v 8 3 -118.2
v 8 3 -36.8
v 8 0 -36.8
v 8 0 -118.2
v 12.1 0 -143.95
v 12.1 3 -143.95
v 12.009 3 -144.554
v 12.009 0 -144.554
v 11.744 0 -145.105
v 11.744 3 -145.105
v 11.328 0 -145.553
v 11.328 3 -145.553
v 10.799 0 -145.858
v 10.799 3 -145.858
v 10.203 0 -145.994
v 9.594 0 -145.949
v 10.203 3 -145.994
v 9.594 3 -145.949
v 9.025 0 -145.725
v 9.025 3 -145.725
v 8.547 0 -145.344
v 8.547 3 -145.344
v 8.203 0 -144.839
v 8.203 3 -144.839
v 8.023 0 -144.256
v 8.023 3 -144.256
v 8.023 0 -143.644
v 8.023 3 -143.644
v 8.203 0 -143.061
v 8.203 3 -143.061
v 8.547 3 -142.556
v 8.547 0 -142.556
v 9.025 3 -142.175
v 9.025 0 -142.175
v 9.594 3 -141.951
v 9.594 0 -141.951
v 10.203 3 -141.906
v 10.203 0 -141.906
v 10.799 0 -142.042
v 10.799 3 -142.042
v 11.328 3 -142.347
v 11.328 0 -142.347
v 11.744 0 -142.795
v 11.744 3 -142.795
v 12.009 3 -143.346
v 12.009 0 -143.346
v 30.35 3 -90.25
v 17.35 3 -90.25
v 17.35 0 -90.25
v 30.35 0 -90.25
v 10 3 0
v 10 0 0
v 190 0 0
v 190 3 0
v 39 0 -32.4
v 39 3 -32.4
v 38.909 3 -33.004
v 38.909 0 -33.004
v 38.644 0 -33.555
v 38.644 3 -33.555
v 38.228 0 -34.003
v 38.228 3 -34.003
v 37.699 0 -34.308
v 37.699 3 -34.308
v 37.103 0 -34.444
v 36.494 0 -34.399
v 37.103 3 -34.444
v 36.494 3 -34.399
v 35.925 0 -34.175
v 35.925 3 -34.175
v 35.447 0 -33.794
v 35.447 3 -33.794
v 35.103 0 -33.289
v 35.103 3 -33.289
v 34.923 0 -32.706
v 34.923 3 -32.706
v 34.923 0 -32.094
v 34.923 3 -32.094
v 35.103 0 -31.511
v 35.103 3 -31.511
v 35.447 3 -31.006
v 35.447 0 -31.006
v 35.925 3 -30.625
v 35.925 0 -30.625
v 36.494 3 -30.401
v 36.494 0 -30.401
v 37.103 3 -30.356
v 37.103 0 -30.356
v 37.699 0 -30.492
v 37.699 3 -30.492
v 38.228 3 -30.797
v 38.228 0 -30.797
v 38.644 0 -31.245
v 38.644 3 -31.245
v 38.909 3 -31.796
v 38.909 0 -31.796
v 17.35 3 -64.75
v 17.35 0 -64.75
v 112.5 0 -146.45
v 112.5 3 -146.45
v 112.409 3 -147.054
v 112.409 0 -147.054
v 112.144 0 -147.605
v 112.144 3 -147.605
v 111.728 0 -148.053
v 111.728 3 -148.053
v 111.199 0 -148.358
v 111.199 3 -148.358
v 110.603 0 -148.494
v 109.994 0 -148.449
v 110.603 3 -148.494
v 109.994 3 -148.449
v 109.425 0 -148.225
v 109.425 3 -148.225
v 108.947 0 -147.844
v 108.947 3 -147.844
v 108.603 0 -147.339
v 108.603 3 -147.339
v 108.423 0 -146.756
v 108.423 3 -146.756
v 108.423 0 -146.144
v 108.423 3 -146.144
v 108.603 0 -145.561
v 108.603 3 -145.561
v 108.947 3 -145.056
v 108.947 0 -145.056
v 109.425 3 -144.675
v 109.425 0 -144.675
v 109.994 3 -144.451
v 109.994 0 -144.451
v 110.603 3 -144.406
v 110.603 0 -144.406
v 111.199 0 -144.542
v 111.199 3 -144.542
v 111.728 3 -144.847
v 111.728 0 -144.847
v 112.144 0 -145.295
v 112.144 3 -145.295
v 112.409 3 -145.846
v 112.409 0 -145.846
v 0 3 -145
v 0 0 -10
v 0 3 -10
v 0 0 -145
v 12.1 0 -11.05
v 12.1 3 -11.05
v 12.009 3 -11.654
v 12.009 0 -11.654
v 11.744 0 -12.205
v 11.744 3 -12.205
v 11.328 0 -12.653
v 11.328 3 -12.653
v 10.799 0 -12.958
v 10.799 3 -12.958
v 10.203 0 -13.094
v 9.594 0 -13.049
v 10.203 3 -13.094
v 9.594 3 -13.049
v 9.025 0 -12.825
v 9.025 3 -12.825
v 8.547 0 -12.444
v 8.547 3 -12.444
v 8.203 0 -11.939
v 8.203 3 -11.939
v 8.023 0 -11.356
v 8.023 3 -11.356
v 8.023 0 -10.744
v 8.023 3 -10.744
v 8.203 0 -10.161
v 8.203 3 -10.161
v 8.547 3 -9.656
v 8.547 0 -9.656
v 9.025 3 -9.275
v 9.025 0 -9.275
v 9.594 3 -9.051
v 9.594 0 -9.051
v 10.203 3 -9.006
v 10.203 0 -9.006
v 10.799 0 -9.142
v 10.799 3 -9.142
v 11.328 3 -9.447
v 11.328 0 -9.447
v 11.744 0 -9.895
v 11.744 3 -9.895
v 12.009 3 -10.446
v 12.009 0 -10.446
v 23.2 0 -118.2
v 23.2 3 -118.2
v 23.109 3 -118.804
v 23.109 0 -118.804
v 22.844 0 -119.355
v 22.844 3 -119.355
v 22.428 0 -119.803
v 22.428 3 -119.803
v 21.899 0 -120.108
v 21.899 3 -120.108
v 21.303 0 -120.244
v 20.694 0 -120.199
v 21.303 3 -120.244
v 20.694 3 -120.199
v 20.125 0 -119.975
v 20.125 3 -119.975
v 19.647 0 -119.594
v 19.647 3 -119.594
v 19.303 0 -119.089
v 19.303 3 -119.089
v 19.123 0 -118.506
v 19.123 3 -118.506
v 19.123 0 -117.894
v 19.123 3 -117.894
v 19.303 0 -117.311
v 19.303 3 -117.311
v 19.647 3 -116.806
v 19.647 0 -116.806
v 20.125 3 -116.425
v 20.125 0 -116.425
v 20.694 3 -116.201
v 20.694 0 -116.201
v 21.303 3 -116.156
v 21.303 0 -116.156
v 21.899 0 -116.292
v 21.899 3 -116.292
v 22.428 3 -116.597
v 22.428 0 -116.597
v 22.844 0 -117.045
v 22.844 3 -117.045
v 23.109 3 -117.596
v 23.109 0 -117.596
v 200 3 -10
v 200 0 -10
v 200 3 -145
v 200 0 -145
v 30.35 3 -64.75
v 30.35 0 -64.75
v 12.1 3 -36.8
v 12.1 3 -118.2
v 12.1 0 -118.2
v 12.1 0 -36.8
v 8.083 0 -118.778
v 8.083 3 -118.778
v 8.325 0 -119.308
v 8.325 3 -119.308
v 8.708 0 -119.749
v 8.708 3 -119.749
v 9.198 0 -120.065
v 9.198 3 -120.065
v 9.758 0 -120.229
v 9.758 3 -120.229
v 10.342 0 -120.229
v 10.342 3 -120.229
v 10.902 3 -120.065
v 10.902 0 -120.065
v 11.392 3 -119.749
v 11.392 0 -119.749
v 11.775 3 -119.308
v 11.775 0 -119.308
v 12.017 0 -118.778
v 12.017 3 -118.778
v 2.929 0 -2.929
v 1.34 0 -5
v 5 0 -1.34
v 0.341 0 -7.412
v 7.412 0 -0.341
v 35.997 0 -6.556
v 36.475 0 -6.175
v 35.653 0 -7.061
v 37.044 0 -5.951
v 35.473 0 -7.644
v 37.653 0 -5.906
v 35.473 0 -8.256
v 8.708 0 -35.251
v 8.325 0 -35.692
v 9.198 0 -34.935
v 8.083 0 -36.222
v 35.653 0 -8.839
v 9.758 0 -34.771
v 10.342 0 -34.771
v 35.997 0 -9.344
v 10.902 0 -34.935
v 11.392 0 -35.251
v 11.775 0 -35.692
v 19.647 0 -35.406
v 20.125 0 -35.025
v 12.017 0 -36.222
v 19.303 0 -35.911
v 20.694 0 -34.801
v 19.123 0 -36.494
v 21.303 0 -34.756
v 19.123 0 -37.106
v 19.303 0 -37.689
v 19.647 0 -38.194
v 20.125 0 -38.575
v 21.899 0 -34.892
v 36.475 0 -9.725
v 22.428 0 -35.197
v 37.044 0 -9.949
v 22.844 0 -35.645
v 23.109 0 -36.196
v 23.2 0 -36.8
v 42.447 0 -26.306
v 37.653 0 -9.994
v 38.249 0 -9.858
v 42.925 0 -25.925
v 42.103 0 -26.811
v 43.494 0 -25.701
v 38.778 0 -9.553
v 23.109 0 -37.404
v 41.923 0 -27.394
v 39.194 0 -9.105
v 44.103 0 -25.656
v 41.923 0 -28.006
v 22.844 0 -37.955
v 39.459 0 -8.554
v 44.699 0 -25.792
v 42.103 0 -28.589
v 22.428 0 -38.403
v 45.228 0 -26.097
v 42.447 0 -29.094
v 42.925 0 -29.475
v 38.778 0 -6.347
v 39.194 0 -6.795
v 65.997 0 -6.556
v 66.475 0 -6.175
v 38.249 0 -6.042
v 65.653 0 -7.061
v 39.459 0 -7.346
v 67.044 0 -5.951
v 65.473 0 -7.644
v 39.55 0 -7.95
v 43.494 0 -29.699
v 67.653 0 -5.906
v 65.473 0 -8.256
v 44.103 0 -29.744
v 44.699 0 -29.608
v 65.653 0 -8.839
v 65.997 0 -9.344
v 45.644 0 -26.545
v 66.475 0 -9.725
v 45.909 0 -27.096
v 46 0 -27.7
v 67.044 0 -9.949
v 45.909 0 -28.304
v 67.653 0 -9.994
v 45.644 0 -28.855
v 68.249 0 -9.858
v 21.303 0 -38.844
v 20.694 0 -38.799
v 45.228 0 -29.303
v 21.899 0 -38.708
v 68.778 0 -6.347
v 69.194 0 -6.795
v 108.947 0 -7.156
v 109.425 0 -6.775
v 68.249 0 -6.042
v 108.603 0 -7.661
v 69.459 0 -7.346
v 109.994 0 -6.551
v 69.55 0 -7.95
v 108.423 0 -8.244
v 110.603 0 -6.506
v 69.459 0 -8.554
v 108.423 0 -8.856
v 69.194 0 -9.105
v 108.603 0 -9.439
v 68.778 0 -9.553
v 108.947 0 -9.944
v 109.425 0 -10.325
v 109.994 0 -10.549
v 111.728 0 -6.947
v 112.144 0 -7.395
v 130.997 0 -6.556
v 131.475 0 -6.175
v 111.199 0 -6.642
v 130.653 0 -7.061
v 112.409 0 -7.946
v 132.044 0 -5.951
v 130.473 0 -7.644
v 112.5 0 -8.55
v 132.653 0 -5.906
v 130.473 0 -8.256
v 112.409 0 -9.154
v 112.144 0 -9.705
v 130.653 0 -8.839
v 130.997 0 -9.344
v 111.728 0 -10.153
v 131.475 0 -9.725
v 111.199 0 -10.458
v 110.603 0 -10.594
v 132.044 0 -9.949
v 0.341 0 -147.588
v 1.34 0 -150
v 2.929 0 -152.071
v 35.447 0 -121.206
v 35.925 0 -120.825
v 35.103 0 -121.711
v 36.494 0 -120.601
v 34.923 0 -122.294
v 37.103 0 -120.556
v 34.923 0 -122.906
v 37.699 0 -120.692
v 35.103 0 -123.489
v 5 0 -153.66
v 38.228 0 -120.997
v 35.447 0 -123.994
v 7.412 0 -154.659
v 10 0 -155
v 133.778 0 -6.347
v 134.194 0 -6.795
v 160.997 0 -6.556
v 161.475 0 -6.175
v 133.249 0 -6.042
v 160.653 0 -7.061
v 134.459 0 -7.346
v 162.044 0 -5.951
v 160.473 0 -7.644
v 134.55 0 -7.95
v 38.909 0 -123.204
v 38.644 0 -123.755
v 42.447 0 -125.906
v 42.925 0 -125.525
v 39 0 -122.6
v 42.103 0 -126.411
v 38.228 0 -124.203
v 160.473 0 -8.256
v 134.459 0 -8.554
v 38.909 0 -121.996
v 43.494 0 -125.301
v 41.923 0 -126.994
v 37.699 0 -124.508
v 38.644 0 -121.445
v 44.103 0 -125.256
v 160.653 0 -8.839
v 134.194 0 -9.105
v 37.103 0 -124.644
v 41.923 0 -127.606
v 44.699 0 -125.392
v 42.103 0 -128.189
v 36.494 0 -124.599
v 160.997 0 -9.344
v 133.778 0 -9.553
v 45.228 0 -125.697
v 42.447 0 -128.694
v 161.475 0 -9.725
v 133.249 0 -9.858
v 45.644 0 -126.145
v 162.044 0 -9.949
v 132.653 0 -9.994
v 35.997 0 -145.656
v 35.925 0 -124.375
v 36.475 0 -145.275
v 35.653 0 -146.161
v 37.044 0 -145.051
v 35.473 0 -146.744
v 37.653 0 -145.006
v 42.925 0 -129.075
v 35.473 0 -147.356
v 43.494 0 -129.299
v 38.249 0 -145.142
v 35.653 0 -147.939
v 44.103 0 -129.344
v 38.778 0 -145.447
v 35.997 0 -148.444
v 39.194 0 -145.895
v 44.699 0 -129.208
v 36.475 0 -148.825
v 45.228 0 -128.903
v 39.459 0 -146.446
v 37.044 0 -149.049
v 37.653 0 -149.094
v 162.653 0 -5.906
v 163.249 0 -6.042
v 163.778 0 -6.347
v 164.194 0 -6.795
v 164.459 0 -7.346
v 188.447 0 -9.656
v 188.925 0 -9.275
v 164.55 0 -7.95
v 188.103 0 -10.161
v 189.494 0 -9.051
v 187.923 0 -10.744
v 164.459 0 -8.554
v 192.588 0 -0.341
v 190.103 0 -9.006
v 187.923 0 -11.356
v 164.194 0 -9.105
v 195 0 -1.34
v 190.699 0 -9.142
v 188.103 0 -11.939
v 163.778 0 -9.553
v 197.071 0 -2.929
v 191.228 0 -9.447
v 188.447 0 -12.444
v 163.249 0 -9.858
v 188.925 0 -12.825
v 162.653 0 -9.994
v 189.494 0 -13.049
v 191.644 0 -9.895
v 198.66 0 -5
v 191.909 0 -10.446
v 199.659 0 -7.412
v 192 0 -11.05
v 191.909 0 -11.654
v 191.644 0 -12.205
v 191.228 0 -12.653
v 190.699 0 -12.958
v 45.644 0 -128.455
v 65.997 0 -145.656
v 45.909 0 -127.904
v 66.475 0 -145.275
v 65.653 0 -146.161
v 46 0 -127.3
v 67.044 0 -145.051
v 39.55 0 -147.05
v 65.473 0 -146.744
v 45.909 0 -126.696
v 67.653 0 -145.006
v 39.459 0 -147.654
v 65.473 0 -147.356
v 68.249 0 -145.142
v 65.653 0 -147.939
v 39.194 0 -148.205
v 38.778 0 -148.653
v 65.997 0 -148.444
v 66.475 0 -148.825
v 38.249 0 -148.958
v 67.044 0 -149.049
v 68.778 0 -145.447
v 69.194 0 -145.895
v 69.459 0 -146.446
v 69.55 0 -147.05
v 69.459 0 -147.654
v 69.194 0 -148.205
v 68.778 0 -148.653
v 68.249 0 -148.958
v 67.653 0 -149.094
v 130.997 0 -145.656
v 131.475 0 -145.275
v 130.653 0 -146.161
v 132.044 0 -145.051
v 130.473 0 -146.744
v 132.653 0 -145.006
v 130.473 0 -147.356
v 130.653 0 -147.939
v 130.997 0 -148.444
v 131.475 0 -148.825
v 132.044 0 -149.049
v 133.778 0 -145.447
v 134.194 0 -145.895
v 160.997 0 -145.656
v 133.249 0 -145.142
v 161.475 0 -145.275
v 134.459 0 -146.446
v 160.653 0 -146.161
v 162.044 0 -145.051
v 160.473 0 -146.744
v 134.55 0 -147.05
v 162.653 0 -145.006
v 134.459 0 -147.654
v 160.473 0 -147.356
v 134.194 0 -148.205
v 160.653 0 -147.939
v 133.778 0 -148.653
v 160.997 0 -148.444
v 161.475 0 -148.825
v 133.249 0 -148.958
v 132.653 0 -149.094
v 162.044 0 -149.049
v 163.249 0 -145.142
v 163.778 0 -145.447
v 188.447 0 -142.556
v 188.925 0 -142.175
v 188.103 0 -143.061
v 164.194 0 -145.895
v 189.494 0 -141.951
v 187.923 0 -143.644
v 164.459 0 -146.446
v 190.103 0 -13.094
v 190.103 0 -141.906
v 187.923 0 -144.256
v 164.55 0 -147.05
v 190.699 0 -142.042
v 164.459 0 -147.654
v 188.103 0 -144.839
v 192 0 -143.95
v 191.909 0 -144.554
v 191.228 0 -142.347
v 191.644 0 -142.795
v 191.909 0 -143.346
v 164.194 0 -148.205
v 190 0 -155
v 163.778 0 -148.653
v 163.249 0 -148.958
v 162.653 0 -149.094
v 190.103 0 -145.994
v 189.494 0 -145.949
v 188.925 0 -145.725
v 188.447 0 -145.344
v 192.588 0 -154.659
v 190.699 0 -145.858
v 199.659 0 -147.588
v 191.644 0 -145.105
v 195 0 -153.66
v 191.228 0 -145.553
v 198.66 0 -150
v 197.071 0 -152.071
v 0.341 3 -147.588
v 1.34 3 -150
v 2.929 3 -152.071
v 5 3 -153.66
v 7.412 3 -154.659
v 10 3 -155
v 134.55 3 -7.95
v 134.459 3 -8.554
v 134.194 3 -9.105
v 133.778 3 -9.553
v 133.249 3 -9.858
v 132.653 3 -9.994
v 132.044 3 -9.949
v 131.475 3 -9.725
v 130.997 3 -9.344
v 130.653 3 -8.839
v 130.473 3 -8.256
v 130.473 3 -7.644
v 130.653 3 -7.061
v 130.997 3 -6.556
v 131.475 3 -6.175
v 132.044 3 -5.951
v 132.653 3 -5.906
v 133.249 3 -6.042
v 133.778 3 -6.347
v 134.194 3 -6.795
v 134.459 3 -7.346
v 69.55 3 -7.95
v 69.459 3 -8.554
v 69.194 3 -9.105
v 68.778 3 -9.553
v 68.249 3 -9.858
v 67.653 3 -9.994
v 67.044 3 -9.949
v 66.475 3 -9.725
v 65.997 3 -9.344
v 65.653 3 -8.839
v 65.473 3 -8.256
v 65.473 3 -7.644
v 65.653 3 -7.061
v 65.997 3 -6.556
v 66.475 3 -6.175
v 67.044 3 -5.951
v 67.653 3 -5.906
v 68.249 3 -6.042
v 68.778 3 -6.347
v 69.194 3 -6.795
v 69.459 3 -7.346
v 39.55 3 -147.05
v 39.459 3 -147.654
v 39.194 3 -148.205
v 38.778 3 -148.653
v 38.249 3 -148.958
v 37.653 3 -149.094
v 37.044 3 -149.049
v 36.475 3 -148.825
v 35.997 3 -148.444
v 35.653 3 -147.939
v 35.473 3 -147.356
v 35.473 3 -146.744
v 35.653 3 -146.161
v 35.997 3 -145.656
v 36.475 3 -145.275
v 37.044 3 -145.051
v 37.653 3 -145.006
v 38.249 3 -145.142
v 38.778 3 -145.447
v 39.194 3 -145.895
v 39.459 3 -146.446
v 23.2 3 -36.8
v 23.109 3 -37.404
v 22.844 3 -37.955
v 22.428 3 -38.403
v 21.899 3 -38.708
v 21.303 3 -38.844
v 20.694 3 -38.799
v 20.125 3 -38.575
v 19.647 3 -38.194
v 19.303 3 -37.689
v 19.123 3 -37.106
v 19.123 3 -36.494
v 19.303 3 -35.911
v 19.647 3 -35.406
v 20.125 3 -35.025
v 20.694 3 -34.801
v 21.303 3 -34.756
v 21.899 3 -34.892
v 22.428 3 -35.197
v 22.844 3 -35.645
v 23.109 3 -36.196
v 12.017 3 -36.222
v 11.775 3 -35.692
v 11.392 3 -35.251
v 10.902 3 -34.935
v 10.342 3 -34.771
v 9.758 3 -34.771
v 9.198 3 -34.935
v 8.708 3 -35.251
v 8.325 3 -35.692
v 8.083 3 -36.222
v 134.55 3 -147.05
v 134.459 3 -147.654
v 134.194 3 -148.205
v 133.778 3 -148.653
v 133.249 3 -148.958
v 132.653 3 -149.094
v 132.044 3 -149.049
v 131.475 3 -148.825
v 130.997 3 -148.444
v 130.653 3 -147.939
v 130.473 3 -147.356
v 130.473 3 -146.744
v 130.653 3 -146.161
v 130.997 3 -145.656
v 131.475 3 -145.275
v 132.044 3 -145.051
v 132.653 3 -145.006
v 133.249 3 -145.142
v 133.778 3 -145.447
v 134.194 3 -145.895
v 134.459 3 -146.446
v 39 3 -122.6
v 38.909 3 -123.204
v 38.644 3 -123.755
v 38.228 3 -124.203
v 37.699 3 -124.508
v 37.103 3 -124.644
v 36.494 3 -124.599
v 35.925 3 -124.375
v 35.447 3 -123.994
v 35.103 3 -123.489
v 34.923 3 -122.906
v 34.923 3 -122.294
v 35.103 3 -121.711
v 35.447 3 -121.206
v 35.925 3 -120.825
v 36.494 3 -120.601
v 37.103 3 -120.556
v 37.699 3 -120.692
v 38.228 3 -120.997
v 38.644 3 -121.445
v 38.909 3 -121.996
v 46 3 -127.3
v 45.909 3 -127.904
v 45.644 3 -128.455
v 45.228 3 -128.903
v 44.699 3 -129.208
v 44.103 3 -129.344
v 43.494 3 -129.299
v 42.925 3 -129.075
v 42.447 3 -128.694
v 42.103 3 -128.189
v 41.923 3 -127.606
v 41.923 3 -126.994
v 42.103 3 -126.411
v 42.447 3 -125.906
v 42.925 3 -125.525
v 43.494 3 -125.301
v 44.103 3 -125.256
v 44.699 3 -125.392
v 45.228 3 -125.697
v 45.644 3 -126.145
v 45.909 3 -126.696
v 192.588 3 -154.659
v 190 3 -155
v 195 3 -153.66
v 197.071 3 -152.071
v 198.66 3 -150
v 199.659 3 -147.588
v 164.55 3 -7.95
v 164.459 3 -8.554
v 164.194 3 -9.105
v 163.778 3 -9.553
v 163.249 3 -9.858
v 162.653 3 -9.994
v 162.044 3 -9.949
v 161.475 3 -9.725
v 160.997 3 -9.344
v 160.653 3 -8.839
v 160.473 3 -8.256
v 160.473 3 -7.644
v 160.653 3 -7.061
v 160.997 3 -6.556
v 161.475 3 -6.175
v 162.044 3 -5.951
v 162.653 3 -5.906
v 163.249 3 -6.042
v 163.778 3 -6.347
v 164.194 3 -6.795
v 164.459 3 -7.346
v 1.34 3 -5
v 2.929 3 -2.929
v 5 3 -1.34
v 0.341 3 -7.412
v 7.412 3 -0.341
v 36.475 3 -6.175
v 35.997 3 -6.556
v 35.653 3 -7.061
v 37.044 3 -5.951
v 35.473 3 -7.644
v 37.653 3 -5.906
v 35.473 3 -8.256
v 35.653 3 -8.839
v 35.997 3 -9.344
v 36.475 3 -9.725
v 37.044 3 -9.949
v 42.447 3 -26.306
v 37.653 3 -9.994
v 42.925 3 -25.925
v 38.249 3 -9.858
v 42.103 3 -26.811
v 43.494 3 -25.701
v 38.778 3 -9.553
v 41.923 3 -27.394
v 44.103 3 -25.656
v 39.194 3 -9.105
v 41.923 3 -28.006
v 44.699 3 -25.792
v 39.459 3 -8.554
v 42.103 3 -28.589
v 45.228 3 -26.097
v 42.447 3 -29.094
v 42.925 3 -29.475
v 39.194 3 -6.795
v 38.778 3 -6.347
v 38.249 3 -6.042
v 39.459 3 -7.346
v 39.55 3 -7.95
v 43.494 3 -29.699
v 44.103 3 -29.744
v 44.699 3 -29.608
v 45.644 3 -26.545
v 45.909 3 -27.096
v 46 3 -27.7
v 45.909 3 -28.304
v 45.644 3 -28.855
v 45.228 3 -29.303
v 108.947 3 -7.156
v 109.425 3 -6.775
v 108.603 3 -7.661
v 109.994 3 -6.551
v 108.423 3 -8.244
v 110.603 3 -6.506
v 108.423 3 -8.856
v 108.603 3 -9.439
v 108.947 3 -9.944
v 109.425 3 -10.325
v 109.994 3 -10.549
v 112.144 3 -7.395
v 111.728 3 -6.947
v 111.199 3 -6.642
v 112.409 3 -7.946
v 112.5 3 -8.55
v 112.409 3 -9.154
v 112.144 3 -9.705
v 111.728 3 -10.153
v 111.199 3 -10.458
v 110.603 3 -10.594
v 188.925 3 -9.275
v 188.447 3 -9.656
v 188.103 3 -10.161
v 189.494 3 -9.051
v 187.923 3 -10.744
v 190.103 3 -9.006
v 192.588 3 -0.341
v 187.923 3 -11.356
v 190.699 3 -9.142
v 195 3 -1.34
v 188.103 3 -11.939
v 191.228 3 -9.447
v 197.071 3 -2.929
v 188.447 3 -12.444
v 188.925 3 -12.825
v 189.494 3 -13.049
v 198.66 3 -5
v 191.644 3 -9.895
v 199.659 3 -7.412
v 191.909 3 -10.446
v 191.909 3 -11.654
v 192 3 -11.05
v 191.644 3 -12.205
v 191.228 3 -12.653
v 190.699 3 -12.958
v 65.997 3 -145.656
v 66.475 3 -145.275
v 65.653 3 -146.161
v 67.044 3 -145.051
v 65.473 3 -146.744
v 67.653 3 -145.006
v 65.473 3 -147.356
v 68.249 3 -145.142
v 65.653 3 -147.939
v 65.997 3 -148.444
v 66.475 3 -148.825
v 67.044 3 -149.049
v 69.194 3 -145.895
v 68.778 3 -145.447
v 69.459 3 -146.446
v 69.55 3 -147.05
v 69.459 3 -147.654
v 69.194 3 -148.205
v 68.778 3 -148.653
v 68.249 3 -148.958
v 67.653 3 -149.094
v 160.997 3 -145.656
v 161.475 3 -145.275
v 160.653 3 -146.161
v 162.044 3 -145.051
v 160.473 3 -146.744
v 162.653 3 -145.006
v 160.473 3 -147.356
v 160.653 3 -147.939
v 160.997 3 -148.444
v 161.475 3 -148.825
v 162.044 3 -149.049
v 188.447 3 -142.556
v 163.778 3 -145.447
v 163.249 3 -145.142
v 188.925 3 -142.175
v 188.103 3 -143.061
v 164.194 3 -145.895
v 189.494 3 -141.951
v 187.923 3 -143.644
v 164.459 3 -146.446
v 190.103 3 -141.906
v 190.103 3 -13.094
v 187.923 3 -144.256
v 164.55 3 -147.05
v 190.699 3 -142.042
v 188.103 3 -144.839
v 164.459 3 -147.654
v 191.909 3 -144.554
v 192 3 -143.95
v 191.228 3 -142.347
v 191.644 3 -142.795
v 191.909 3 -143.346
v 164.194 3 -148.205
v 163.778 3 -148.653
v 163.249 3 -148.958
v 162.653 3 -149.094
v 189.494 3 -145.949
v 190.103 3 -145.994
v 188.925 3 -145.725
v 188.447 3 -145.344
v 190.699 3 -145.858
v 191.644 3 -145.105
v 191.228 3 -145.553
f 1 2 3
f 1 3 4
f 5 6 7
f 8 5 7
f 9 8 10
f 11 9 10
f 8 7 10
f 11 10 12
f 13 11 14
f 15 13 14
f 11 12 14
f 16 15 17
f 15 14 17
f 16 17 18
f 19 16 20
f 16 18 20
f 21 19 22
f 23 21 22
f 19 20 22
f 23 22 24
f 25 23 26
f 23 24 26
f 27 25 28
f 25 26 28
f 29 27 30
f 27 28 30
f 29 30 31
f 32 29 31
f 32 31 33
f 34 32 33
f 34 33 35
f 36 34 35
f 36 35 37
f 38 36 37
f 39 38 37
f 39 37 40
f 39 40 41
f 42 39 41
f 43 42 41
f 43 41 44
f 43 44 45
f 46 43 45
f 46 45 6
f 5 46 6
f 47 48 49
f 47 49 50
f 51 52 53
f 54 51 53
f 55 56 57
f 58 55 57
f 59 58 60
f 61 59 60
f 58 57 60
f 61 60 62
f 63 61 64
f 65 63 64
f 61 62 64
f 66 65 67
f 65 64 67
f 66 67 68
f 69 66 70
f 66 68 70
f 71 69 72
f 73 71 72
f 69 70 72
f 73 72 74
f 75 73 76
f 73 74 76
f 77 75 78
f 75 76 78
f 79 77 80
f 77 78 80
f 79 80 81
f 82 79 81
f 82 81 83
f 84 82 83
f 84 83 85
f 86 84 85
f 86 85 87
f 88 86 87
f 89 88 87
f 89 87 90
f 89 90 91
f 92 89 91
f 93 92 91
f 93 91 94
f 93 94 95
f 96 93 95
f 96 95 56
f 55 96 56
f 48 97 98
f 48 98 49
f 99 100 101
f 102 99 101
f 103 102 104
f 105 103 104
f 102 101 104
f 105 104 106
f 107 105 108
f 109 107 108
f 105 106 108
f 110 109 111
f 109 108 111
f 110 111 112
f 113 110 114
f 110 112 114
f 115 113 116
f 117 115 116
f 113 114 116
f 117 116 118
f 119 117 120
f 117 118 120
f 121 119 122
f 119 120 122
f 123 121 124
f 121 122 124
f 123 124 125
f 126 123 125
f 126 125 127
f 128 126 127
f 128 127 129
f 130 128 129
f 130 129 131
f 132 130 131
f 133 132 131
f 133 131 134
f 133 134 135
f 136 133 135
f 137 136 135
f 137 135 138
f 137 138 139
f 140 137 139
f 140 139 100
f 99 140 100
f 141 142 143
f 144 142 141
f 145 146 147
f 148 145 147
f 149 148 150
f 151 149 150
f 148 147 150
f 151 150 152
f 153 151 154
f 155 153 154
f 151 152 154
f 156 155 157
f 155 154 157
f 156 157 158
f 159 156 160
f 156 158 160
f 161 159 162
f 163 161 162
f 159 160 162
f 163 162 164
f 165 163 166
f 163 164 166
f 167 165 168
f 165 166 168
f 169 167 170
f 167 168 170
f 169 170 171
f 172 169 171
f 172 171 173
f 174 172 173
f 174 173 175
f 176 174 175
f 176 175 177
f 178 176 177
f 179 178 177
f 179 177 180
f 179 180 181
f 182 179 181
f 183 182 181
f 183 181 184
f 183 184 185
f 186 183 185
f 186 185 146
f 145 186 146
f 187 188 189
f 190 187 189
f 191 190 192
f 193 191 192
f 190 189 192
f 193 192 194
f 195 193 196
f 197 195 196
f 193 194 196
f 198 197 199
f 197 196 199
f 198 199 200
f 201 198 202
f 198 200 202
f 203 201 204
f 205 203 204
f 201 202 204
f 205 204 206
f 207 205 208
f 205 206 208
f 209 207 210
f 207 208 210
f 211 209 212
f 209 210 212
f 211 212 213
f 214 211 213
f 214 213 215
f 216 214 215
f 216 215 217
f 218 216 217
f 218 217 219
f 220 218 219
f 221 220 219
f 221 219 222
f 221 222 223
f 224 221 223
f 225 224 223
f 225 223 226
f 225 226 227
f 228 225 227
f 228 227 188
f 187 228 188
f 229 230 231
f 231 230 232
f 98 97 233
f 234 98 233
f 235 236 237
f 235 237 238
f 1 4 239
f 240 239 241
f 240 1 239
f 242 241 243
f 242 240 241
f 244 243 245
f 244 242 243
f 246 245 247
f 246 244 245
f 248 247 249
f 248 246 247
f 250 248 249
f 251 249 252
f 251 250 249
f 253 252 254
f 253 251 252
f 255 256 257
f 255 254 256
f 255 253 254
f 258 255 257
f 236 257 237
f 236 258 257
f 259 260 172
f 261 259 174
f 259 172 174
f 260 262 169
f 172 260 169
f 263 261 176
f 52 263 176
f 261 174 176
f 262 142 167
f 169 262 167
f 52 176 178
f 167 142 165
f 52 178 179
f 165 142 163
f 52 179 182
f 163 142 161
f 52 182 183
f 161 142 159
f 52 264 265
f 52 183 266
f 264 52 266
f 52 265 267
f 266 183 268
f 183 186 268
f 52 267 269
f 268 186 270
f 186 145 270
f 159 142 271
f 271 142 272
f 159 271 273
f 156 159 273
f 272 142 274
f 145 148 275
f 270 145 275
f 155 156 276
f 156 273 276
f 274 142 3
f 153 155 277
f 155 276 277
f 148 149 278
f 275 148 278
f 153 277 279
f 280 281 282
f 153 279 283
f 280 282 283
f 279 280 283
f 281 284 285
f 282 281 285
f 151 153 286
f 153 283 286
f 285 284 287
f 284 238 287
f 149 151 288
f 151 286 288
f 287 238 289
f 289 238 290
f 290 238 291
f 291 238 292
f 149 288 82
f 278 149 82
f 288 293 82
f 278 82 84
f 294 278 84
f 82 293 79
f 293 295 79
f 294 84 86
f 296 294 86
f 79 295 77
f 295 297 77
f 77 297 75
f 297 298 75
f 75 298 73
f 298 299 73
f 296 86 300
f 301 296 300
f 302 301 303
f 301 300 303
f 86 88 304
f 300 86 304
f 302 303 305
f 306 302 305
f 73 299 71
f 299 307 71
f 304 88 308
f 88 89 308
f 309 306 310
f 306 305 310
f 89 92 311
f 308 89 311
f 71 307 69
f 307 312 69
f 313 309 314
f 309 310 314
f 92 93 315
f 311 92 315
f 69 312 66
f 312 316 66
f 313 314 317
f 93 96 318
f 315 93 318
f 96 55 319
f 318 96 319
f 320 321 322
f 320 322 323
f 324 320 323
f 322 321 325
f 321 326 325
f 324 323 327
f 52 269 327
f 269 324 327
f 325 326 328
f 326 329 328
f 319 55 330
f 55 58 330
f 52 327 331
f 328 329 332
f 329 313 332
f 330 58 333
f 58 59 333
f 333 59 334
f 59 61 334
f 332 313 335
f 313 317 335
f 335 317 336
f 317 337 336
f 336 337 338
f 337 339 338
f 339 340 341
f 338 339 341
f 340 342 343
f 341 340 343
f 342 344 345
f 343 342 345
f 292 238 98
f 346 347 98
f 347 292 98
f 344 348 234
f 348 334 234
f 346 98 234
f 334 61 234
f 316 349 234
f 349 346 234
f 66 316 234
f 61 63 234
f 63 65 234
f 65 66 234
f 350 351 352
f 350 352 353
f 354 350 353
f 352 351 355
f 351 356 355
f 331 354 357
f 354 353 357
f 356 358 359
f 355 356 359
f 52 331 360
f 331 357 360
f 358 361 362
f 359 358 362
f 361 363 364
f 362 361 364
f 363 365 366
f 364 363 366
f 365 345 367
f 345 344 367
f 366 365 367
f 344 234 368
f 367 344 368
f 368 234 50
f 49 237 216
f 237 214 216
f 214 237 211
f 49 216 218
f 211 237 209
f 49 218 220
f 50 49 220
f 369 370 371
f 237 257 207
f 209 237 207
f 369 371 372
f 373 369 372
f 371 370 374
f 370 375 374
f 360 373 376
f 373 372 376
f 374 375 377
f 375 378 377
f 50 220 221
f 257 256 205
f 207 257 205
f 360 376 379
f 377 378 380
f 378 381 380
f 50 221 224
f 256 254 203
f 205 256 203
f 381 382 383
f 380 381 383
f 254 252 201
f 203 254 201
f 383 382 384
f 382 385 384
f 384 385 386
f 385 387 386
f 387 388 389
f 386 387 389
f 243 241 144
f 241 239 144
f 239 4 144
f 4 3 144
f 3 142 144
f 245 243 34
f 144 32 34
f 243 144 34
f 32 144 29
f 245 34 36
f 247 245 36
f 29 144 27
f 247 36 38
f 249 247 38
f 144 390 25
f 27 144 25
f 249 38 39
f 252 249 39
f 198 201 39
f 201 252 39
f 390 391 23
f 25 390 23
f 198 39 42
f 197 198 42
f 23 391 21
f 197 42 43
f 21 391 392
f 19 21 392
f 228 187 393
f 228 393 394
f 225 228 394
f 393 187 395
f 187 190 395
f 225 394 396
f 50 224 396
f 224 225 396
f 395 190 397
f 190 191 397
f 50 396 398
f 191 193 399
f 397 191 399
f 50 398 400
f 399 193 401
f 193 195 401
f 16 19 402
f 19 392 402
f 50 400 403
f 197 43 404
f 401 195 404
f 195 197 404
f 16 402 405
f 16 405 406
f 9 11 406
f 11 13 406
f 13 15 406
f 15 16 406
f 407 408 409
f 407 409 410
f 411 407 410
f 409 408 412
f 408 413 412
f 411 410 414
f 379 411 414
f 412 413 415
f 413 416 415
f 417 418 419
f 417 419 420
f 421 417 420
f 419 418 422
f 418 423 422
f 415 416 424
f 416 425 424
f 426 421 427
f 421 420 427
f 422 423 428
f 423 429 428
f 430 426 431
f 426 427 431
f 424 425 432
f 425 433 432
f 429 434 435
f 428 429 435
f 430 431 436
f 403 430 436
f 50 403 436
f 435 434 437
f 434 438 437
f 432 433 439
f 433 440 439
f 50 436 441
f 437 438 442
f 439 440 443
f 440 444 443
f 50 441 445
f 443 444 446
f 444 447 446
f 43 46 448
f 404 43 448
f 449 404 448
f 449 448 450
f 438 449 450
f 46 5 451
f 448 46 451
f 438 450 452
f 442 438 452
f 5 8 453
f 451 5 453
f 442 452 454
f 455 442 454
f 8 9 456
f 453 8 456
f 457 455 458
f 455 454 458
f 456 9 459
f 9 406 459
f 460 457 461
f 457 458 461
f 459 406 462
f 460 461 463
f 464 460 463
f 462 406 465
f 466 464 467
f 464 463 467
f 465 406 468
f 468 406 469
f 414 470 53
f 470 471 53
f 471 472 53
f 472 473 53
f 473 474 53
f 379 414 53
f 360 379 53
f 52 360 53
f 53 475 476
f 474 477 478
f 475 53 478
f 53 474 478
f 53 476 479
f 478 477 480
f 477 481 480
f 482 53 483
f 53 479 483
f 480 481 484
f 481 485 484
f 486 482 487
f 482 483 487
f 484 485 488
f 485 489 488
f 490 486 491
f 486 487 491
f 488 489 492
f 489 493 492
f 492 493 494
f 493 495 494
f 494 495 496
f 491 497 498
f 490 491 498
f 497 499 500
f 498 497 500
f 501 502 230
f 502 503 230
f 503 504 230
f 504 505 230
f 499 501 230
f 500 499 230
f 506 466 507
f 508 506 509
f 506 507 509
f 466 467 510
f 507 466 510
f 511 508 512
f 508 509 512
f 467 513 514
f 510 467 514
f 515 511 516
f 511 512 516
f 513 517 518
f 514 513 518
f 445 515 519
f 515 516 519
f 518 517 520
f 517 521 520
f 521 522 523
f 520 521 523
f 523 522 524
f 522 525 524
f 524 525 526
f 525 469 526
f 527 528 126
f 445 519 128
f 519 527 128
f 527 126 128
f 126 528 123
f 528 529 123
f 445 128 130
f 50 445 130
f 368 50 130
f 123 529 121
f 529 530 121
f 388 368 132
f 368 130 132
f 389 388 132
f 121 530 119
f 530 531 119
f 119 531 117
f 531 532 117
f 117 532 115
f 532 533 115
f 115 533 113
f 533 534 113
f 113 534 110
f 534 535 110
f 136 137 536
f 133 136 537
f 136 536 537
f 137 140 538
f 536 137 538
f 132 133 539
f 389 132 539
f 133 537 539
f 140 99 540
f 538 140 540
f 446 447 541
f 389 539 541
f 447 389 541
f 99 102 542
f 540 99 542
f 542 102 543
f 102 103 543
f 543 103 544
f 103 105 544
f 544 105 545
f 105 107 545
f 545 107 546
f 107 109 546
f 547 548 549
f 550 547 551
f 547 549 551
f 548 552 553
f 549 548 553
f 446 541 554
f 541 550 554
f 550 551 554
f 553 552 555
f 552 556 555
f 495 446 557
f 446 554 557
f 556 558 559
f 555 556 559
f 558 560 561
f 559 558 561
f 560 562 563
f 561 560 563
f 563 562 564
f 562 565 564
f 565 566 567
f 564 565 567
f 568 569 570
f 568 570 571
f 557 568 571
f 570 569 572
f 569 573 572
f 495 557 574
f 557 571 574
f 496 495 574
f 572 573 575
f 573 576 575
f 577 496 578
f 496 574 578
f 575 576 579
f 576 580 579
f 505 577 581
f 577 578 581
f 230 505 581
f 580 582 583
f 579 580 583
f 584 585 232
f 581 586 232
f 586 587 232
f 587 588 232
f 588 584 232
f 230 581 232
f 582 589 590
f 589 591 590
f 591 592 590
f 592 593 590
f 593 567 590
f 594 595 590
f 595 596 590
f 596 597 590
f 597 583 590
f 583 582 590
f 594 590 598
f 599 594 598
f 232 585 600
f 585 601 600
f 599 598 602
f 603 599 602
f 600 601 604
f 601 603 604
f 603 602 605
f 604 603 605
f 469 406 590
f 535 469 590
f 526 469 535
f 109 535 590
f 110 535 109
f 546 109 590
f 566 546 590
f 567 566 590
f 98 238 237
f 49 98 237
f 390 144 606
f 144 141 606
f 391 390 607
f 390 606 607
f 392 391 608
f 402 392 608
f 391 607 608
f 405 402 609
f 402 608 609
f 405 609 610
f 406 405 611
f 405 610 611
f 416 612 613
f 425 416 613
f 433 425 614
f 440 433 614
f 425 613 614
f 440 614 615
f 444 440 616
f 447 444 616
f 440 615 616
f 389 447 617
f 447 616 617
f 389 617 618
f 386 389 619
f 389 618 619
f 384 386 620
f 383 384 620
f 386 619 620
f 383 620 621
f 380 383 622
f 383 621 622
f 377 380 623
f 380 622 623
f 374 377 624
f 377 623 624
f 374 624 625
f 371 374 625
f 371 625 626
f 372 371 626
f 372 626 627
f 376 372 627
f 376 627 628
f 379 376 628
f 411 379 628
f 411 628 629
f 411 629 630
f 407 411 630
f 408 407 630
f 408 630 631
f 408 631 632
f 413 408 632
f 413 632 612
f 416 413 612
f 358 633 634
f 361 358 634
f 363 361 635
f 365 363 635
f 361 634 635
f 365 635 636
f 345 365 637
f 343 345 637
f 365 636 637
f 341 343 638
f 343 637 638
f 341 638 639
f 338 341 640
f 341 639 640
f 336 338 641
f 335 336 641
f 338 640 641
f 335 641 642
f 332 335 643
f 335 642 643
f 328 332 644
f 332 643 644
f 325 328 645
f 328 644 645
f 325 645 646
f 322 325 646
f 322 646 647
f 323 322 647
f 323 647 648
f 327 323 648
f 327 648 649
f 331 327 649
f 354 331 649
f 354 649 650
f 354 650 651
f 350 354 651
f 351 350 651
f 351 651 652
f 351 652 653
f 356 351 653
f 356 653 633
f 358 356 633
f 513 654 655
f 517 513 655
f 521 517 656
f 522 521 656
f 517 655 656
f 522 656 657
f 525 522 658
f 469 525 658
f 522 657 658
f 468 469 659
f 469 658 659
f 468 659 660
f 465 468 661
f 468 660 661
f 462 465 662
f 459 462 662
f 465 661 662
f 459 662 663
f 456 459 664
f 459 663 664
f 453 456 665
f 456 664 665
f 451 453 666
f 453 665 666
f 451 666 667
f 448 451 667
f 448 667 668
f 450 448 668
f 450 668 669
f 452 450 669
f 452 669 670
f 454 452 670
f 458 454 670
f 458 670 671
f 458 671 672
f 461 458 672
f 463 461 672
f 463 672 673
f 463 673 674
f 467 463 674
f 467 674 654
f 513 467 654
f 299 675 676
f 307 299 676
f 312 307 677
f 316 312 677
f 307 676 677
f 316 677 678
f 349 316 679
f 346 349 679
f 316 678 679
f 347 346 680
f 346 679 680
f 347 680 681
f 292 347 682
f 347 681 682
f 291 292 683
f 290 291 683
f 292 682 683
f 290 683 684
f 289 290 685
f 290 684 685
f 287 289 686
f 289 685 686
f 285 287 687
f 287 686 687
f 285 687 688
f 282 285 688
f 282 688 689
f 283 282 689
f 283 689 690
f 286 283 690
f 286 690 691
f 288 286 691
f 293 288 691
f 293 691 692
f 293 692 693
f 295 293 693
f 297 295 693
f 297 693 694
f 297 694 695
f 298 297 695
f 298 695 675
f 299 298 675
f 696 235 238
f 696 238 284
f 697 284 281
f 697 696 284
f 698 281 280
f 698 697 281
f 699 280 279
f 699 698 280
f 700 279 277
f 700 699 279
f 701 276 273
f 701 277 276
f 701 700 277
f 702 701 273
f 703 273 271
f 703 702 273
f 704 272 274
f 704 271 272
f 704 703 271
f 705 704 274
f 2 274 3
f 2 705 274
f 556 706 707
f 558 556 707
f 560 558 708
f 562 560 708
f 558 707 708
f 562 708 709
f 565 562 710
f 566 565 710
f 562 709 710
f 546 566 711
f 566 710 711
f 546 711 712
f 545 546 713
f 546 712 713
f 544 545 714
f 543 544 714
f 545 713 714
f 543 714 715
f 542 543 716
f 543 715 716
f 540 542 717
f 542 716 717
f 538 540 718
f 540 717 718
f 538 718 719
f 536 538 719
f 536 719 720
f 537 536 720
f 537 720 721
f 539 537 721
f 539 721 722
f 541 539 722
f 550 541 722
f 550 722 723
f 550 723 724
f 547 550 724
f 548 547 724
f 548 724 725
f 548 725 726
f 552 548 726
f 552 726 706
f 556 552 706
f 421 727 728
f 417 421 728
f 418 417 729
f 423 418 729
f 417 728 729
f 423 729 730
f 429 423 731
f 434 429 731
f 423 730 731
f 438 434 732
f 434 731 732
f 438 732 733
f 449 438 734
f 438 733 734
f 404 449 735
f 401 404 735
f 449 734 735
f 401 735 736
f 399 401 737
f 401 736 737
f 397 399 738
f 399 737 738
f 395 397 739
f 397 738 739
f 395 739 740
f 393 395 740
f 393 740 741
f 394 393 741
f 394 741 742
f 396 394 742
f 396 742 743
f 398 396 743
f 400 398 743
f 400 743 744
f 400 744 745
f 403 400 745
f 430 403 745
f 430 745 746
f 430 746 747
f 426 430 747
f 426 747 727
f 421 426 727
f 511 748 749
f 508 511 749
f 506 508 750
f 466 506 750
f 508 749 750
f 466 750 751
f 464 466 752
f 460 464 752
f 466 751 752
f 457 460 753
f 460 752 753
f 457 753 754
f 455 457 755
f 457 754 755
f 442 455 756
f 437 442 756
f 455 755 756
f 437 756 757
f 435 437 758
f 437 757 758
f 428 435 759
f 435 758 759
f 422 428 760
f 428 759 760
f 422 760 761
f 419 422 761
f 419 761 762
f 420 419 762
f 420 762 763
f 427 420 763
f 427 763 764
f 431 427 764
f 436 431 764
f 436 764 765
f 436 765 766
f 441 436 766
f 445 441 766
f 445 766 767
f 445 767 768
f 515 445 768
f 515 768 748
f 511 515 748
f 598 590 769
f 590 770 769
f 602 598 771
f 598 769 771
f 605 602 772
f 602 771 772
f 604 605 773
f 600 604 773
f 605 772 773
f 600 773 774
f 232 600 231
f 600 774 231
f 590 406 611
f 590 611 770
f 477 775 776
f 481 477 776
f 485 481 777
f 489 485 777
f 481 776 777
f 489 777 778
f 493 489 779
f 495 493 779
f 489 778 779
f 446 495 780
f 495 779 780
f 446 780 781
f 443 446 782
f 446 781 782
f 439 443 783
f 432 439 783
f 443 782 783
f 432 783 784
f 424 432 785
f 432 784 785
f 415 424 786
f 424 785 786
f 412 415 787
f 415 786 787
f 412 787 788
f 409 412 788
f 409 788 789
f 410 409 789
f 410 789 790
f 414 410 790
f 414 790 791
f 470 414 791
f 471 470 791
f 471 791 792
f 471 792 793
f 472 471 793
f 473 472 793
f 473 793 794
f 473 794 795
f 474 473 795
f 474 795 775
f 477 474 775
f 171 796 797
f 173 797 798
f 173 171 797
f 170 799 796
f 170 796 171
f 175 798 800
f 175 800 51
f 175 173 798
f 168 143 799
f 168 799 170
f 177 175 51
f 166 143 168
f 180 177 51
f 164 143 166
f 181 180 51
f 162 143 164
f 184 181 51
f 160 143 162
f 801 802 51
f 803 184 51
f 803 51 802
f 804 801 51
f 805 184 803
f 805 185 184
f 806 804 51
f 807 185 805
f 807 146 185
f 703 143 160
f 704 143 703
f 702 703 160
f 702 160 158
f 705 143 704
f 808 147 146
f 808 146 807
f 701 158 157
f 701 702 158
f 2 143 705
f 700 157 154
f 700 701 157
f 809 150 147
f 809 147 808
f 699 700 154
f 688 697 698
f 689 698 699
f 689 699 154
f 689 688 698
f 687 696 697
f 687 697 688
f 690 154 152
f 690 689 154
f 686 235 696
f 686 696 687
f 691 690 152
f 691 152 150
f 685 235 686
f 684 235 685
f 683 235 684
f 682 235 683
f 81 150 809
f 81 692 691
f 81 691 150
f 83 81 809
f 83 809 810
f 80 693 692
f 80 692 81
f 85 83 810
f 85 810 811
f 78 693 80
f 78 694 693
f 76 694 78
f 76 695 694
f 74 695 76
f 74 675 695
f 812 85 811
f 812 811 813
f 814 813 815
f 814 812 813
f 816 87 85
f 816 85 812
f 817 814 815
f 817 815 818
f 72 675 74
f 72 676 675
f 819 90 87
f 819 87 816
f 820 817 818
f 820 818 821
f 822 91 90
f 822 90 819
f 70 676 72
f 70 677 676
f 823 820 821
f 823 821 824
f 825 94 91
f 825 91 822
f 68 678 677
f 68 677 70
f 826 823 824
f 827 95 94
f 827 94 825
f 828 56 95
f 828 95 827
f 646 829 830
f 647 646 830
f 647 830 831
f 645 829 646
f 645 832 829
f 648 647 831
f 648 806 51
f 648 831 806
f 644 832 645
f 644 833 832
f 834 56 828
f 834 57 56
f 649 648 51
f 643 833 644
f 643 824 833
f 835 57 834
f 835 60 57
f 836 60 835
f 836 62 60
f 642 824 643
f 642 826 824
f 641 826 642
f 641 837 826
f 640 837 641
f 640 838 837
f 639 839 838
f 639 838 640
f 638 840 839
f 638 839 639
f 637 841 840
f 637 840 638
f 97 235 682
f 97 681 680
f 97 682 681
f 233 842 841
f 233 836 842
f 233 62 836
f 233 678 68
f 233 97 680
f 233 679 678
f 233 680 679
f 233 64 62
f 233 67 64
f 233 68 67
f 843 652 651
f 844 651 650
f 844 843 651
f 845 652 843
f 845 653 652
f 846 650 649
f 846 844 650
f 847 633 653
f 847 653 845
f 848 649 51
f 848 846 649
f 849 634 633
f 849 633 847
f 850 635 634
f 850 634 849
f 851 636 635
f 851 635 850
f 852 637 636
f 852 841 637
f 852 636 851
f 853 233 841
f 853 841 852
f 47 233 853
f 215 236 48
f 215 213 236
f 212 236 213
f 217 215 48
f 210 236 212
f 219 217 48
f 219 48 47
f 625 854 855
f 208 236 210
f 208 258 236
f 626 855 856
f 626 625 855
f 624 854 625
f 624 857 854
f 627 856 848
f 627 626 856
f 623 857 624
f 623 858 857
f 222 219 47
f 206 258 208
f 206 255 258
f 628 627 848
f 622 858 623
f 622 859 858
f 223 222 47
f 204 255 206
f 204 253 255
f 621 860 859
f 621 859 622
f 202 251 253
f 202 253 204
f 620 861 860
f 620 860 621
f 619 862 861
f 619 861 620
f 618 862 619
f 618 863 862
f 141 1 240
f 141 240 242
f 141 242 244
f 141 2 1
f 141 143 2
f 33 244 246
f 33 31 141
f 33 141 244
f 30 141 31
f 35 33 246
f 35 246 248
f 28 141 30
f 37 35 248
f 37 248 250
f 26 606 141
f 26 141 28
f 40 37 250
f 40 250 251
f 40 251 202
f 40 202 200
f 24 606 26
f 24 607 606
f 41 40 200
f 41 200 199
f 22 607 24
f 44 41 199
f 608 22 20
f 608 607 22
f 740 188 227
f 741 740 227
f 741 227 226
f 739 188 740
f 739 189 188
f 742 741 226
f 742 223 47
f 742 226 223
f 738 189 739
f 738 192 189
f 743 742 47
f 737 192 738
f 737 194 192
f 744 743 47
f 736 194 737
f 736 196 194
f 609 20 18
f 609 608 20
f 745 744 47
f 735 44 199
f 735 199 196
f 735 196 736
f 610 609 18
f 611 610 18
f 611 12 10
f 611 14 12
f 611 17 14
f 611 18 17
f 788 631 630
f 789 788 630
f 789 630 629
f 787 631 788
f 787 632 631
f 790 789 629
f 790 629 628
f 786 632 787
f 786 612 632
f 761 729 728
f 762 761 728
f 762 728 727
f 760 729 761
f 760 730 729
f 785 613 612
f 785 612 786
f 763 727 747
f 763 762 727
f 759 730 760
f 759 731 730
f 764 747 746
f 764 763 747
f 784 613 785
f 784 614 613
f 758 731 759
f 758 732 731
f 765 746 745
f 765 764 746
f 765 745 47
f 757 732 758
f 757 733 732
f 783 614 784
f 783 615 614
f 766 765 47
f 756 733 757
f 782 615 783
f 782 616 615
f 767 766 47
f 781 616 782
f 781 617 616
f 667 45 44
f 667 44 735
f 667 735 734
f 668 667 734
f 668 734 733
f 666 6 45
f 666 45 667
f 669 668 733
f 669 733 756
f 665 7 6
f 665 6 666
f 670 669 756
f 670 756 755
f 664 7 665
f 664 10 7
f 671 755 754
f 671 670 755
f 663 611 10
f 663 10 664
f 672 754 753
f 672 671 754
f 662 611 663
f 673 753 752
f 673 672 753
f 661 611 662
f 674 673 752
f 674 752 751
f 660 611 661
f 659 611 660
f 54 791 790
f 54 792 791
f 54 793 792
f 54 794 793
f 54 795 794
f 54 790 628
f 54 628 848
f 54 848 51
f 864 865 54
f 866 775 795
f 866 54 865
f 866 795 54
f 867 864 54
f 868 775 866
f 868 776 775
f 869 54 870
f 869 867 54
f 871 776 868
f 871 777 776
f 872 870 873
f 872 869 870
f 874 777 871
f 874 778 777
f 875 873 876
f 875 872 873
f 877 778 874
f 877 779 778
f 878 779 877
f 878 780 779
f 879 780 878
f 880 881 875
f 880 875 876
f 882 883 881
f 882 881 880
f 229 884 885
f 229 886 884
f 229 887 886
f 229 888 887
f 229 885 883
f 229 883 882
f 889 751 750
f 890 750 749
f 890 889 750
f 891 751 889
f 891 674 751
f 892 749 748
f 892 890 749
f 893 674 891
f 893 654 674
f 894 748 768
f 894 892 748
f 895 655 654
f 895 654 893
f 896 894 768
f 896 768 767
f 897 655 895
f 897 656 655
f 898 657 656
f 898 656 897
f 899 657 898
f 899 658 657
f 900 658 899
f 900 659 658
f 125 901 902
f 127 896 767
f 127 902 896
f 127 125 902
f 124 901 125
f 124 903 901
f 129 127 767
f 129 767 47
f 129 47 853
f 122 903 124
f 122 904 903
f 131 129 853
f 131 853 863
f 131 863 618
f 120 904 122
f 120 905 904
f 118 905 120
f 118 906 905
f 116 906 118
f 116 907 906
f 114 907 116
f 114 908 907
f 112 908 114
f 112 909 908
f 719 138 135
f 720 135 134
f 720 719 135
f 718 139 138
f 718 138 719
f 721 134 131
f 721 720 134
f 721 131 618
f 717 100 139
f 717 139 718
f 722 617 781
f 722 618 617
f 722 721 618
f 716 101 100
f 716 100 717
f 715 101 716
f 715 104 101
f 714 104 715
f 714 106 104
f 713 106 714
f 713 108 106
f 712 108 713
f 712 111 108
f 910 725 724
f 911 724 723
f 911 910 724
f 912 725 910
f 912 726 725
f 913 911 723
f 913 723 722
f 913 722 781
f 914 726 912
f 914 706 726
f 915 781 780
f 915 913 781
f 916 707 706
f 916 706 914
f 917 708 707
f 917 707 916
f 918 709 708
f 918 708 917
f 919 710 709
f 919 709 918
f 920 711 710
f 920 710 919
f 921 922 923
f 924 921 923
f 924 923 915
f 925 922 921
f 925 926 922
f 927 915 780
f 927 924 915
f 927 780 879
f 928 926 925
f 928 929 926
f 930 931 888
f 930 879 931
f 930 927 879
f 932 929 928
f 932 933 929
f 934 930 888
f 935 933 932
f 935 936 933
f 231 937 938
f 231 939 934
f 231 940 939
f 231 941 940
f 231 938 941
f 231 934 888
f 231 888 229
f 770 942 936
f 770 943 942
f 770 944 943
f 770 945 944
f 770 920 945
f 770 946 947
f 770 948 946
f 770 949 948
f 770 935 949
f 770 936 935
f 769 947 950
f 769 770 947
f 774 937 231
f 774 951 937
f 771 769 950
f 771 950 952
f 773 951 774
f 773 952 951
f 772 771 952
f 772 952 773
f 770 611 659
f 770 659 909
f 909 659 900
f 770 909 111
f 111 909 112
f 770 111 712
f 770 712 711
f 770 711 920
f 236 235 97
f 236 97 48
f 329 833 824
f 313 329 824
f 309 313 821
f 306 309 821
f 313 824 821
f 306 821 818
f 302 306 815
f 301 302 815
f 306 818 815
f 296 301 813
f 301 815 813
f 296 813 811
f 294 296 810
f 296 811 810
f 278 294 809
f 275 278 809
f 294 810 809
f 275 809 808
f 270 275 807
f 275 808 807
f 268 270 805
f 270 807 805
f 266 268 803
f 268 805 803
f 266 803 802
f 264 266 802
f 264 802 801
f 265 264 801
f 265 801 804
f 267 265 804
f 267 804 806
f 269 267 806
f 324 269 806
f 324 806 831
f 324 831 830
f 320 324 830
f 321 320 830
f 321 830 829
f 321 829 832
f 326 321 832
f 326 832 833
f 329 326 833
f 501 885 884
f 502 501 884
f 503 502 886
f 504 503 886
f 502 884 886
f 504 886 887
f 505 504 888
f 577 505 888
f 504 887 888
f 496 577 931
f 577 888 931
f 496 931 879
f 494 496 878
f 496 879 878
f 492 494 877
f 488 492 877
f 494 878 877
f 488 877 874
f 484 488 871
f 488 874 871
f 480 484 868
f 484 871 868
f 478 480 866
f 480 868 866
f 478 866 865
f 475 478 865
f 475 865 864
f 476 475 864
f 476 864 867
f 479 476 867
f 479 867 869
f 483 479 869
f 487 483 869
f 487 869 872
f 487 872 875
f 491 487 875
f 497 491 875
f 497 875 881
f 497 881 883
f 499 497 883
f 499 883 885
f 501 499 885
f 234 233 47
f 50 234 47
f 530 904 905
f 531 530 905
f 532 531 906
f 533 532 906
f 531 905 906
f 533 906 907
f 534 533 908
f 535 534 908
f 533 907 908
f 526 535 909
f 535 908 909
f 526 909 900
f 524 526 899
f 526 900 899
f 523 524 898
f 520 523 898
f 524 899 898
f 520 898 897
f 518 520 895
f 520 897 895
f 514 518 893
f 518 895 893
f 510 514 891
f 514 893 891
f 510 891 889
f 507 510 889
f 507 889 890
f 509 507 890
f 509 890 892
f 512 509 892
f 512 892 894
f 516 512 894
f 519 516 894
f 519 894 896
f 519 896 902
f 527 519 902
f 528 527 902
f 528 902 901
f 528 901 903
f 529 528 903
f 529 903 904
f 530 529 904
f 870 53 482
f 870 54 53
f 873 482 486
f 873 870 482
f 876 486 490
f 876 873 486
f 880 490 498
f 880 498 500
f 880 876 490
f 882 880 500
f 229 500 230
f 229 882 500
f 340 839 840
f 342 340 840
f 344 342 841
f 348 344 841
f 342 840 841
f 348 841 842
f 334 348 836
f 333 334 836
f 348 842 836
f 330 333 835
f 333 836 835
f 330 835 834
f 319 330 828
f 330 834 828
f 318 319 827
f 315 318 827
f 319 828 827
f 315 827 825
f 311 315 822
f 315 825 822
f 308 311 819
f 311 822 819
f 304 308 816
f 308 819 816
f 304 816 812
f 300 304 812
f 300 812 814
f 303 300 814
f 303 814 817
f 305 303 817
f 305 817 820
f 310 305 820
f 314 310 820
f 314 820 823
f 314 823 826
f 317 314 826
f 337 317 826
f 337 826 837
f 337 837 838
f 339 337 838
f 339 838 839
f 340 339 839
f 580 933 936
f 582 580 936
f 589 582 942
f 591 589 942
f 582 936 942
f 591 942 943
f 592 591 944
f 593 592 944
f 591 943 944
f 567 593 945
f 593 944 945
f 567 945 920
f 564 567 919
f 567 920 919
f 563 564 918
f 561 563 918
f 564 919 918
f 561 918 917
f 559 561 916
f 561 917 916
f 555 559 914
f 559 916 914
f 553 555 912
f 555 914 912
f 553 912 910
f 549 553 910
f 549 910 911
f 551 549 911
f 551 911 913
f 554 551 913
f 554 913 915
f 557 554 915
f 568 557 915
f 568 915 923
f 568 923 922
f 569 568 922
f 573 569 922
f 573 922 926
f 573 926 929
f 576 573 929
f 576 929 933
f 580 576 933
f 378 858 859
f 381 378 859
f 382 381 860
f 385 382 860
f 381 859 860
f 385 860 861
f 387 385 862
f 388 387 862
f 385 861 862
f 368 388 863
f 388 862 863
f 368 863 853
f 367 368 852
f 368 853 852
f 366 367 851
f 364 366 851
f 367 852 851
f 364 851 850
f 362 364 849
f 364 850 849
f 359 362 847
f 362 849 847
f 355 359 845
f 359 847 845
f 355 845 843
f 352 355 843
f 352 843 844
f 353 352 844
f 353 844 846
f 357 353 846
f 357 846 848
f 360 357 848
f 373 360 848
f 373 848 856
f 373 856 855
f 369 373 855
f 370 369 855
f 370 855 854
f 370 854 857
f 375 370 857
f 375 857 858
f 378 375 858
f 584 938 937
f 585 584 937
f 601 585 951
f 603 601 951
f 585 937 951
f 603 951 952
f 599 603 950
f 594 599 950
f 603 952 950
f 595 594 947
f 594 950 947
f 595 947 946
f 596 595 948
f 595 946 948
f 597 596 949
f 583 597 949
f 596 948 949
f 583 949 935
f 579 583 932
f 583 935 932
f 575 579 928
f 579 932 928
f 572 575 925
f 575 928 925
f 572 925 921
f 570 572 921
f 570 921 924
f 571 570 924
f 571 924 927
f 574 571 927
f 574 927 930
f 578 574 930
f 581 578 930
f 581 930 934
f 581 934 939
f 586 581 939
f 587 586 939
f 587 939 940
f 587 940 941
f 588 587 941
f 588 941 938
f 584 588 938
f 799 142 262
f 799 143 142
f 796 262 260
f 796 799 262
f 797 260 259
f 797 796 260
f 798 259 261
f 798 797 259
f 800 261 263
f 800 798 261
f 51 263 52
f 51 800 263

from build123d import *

# Parameters (mm, degrees)
SKETCH1_W           = 200
SKETCH1_H           = 155
BOSS_EXTRUDE1_DEPTH = 3
SKETCH2_R           = 2.05
CUT_EXTRUDE1_DEPTH  = 4
FILLET1_R           = 10
SKETCH6_R           = 2.05
SKETCH6_W           = 13
SKETCH6_H           = 25.5
CUT_EXTRUDE2_DEPTH  = 4


with BuildPart() as part:
    # Sketch1 → Boss-Extrude1 (new body)
    with BuildSketch(Plane(origin=(0, 0, 0), x_dir=(1, 0, 0), z_dir=(0, 1, 0))):
        with Locations((100, 77.5)):
            Rectangle(SKETCH1_W, SKETCH1_H)
    extrude(amount=BOSS_EXTRUDE1_DEPTH)

    # Sketch2 → Cut-Extrude1 (cut, through all)
    with BuildSketch(Plane(origin=(0, 3, 0), x_dir=(1, 0, 0), z_dir=(0, 1, 0))):
        with Locations((37.5, 7.95)):
            Circle(SKETCH2_R)
        with Locations((67.5, 7.95)):
            Circle(SKETCH2_R)
        with Locations((132.5, 7.95)):
            Circle(SKETCH2_R)
        with Locations((162.5, 7.95)):
            Circle(SKETCH2_R)
        with Locations((162.5, 147.05)):
            Circle(SKETCH2_R)
        with Locations((132.5, 147.05)):
            Circle(SKETCH2_R)
        with Locations((67.5, 147.05)):
            Circle(SKETCH2_R)
        with Locations((37.5, 147.05)):
            Circle(SKETCH2_R)
    extrude(amount=-CUT_EXTRUDE1_DEPTH, mode=Mode.SUBTRACT)

    # Fillet1
    fillet1_edges = [part.edges().sort_by_distance(p)[0] for p in [
        (0, 1.5, -155),
        (200, 1.5, -155),
        (200, 1.5, 0),
        (0, 1.5, 0),
    ]]
    fillet(fillet1_edges, radius=FILLET1_R)

    # Sketch6 → Cut-Extrude2 (cut, through all)
    with BuildSketch(Plane(origin=(0, 3, 0), x_dir=(1, 0, 0), z_dir=(0, 1, 0))):
        with Locations((10.05, 143.95)):
            Circle(SKETCH6_R)
        with Locations((21.15, 118.2)):
            Circle(SKETCH6_R)
        with Locations((36.95, 122.6)):
            Circle(SKETCH6_R)
        with Locations((43.95, 127.3)):
            Circle(SKETCH6_R)
        with Locations((43.95, 27.7)):
            Circle(SKETCH6_R)
        with Locations((36.95, 32.4)):
            Circle(SKETCH6_R)
        with Locations((10.05, 11.05)):
            Circle(SKETCH6_R)
        with Locations((21.15, 36.8)):
            Circle(SKETCH6_R)
        with Locations((189.95, 143.95)):
            Circle(SKETCH6_R)
        with Locations((110.45, 146.45)):
            Circle(SKETCH6_R)
        with Locations((189.95, 11.05)):
            Circle(SKETCH6_R)
        with Locations((110.45, 8.55)):
            Circle(SKETCH6_R)
        with BuildLine():
            Line((12.1, 118.2), (12.1, 36.8))
            ThreePointArc((12.1, 36.8), (10.05, 34.75), (8, 36.8))
            Line((8, 36.8), (8, 118.2))
            ThreePointArc((8, 118.2), (10.05, 120.25), (12.1, 118.2))
        make_face()
        with Locations((23.85, 77.5)):
            Rectangle(SKETCH6_W, SKETCH6_H)
    extrude(amount=-CUT_EXTRUDE2_DEPTH, mode=Mode.SUBTRACT)


solid = part.part
